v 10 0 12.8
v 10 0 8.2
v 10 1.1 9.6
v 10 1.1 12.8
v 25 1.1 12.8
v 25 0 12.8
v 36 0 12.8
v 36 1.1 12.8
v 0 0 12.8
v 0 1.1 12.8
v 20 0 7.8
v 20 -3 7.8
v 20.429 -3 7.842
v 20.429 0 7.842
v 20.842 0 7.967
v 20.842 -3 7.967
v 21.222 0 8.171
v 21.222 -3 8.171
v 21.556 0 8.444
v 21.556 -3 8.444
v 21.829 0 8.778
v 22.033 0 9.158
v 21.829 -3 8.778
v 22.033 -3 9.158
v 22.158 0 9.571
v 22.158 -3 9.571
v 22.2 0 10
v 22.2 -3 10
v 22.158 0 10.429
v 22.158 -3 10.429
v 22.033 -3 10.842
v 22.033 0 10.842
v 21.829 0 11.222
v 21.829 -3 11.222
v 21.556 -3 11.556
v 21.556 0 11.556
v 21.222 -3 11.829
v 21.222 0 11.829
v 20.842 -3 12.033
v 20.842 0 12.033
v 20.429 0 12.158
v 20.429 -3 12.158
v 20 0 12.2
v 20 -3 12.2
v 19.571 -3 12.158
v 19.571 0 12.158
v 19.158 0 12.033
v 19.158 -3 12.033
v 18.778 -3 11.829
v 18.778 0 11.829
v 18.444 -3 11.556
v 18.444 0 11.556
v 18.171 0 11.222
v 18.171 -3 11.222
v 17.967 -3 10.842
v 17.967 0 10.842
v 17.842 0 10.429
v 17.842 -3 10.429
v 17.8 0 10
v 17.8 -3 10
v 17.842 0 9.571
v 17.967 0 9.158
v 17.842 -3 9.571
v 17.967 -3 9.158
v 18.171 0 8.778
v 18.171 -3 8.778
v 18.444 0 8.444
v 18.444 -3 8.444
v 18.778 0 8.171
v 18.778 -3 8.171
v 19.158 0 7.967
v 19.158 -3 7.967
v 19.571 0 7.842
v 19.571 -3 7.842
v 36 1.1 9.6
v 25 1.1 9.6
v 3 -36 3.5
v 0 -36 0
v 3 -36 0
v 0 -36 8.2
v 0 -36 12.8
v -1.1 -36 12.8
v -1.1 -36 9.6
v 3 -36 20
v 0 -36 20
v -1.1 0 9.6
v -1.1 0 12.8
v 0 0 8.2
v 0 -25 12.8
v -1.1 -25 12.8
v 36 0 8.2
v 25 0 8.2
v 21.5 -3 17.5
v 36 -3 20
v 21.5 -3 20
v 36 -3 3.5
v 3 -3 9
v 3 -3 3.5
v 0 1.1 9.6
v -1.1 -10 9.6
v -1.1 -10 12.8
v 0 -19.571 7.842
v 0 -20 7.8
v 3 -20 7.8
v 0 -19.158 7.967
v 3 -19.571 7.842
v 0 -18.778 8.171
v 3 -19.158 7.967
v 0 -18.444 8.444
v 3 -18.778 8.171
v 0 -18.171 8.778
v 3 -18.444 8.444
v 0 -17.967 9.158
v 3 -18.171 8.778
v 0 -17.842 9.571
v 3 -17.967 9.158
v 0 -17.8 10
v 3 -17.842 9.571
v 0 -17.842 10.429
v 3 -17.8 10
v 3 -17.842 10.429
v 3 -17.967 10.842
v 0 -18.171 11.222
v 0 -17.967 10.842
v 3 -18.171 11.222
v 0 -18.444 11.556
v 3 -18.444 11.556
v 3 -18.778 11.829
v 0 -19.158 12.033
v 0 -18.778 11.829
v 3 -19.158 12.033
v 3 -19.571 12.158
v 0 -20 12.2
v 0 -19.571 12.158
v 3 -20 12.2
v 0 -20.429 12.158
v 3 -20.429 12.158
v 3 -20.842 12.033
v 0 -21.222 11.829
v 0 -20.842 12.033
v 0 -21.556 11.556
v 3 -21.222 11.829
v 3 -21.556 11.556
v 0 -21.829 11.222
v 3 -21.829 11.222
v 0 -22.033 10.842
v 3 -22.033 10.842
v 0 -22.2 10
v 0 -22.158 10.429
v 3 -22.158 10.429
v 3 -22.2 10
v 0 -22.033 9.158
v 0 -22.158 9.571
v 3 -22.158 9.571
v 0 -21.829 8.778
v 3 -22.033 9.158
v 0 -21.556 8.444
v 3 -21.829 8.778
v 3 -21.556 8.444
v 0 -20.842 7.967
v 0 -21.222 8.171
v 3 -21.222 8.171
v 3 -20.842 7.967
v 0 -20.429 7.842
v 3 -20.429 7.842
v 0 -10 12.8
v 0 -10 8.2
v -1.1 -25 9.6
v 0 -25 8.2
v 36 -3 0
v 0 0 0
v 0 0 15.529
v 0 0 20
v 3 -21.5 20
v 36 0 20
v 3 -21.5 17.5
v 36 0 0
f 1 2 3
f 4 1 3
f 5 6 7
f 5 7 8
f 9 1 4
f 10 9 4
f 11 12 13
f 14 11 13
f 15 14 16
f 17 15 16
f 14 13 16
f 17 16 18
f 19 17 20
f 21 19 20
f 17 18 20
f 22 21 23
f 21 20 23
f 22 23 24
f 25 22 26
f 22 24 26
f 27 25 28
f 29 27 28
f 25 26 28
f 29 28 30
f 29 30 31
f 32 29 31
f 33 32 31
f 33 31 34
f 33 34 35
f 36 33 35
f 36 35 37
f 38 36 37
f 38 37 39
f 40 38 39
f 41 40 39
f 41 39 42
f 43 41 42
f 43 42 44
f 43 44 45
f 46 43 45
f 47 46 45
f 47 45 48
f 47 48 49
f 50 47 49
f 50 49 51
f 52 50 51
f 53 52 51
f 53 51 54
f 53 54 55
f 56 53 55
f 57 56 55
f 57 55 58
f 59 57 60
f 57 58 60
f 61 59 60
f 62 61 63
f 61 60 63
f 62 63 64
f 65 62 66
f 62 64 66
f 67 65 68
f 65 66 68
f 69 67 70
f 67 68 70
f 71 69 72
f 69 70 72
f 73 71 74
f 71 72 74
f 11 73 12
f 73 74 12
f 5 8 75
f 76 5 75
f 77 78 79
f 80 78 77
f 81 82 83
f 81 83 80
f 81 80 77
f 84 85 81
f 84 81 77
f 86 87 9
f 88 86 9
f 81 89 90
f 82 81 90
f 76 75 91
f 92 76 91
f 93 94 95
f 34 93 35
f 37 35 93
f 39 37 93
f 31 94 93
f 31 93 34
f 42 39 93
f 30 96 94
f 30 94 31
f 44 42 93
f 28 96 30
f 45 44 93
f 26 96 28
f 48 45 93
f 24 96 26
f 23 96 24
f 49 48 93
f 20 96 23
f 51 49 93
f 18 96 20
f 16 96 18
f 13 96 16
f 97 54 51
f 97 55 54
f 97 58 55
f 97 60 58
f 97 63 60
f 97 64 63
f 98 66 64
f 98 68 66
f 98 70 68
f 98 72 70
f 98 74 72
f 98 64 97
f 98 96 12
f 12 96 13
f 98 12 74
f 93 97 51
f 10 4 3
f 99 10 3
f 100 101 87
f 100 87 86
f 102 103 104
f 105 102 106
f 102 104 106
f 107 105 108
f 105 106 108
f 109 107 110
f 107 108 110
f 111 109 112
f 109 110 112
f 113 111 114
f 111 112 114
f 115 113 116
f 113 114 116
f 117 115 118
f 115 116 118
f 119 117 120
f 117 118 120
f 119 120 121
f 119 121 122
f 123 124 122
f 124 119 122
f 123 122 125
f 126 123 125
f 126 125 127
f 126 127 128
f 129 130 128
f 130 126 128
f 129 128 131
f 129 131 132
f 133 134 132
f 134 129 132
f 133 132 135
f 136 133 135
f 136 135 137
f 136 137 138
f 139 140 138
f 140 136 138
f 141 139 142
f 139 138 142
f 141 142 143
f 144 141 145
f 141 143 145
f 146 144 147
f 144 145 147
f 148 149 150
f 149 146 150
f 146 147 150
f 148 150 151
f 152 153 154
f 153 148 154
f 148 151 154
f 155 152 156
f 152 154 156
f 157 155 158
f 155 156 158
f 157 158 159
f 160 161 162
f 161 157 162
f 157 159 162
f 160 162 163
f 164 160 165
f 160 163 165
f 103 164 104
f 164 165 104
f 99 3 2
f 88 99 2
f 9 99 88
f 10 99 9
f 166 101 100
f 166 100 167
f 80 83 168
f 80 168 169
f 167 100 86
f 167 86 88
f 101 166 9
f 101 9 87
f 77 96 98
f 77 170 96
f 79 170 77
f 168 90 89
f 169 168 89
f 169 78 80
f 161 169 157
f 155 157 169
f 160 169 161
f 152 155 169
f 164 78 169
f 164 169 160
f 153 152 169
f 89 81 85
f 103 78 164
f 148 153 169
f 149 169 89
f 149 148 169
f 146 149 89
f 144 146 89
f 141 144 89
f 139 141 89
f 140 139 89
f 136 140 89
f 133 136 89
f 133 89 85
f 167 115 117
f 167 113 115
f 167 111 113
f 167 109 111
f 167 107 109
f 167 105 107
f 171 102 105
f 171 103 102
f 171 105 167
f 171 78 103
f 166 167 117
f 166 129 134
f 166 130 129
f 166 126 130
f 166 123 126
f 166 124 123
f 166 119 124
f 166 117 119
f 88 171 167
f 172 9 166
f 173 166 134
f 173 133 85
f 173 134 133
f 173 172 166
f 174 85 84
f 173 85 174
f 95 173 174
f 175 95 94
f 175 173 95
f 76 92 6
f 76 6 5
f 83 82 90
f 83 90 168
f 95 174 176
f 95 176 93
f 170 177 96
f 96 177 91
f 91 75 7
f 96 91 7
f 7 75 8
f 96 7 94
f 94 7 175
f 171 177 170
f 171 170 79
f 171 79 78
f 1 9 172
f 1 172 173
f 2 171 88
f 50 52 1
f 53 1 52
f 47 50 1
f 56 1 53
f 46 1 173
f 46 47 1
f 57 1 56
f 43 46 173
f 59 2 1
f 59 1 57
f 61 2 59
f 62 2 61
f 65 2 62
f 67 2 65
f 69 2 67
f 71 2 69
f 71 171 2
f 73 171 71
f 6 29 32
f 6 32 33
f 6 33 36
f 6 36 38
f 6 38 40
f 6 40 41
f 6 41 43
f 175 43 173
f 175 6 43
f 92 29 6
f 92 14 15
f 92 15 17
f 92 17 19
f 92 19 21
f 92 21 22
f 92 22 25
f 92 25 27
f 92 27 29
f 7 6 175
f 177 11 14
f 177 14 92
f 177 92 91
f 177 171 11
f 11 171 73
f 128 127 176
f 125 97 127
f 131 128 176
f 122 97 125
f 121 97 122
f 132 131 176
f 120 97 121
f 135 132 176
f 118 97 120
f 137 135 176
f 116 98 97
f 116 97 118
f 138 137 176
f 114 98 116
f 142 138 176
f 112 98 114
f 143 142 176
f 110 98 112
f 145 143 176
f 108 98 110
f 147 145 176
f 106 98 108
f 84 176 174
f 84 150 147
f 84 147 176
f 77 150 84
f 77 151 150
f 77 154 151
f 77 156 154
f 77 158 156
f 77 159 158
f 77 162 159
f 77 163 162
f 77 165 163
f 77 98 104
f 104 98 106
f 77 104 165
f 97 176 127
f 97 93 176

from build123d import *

# Parameters (mm, degrees)
BOSS_EXTRUDE1_DEPTH = 3.5
BOSS_EXTRUDE2_DEPTH = 16.5
BOSS_EXTRUDE3_DEPTH = 2.5
SKETCH4_R           = 2.2
CUT_EXTRUDE1_DEPTH  = 53.773099208
SKETCH5_R           = 2.2
CUT_EXTRUDE2_DEPTH  = 53.773099208
BOSS_EXTRUDE5_DEPTH = 36
SKETCH7_W           = 15
SKETCH7_H           = 1.1
CUT_EXTRUDE3_DEPTH  = 53.496095093
BOSS_EXTRUDE6_REACH = 57.429
SKETCH9_W           = 1.1
SKETCH9_H           = 15
CUT_EXTRUDE4_DEPTH  = 53.496095093
BOSS_EXTRUDE7_START = -12.383093
BOSS_EXTRUDE7_DEPTH = 12.383093
CUT_EXTRUDE5_DEPTH  = 60.161910074
CUT_EXTRUDE6_DEPTH  = 55.699177325


with BuildPart() as part:
    # Sketch1 → Boss-Extrude1 (new body)
    with BuildSketch(Plane.XY):
        Polygon((0, -36), (0, 0), (36, 0), (36, -3), (3, -36), align=None)
    extrude(amount=BOSS_EXTRUDE1_DEPTH)

    # Sketch2 → Boss-Extrude2 (add)
    with BuildSketch(Plane.XY.offset(3.5)):
        Polygon((0, -36), (0, 0), (36, 0), (36, -3), (3, -3), (3, -36), align=None)
    extrude(amount=BOSS_EXTRUDE2_DEPTH)

    # Sketch3 → Boss-Extrude3 (add)
    with BuildSketch(Plane.XY.offset(20)):
        Polygon((3, -21.5), (21.5, -3), (3, -3), align=None)
    extrude(amount=-BOSS_EXTRUDE3_DEPTH)

    # Sketch4 → Cut-Extrude1 (cut, through all)
    with BuildSketch(Plane.XZ.offset(3)):
        with Locations(Location((20, 10, 0), (0, 0, 270))):
            Circle(SKETCH4_R)
    extrude(amount=-CUT_EXTRUDE1_DEPTH, mode=Mode.SUBTRACT)

    # Sketch5 → Cut-Extrude2 (cut, through all)
    with BuildSketch(Plane(origin=(3, 0, 0), x_dir=(0, 0, -1), z_dir=(1, 0, 0))):
        with Locations((-10, -20)):
            Circle(SKETCH5_R)
    extrude(amount=-CUT_EXTRUDE2_DEPTH, mode=Mode.SUBTRACT)

    # Sketch6 → Boss-Extrude5 (add, through all)
    with BuildSketch(Plane(origin=(36, 0, 0), x_dir=(0, 0, -1), z_dir=(1, 0, 0))):
        Polygon((-12.8, 0), (-12.8, 1.1), (-9.6, 1.1), (-8.2, 0), align=None)
    extrude(amount=-BOSS_EXTRUDE5_DEPTH)

    # Sketch7 → Cut-Extrude3 (cut, through all)
    with BuildSketch(Plane.XY.offset(12.8)):
        with Locations((17.5, 0.55)):
            Rectangle(SKETCH7_W, SKETCH7_H)
    extrude(amount=-CUT_EXTRUDE3_DEPTH, mode=Mode.SUBTRACT)

    # Boss-Extrude6: up to this face of the body (flat: up to its plane)
    boss_extrude6_end = Plane(part.part.faces().sort_by_distance((0.411825206, 0, 16.4))[0])
    # Sketch8 → Boss-Extrude6 (add, up to the picked face)
    with BuildSketch(Plane.XZ.offset(36), mode=Mode.PRIVATE) as boss_extrude6_sk1:
        Polygon((0, 8.2), (0, 12.8), (-1.1, 12.8), (-1.1, 9.6), align=None)
    boss_extrude6_tool1 = split(extrude(boss_extrude6_sk1.sketch, amount=-BOSS_EXTRUDE6_REACH, mode=Mode.PRIVATE), bisect_by=boss_extrude6_end, keep=Keep.BOTH, mode=Mode.PRIVATE)
    add(boss_extrude6_tool1.solids().sort_by(Axis((-0.517094, -36, 10.82906), (0, 1, 0)))[0])

    # Sketch9 → Cut-Extrude4 (cut, through all)
    with BuildSketch(Plane.XY.offset(12.8)):
        with Locations((-0.55, -17.5)):
            Rectangle(SKETCH9_W, SKETCH9_H)
    extrude(amount=-CUT_EXTRUDE4_DEPTH, mode=Mode.SUBTRACT)

    # Sketch11 → Boss-Extrude7 (add)
    with BuildSketch(Plane(origin=(-2.016949153, 2.016949153, 4.389830508), x_dir=(-0.9228036153935797, -0.16085056987258428, -0.35008653442856574), z_dir=(0.3852706677344363, -0.38527066773443636, -0.8385302768337725)).offset(BOSS_EXTRUDE7_START)):
        Polygon((-25.484240374, -10.032283534), (-5.436637946, -26.842805147), (-5.436637946, -6.483532076), align=None)
    extrude(amount=BOSS_EXTRUDE7_DEPTH)

    # Sketch12 → Cut-Extrude5 (cut, through all)
    with BuildSketch(Plane(origin=(36, 0, 0), x_dir=(0, 0, -1), z_dir=(1, 0, 0))):
        Polygon((-20, 0), (-20, -21.5), (-27.88359819, -21.5), (-27.88359819, 1.770842411), (-14.747015728, 1.770842411), (-14.747015728, 0), align=None)
    extrude(amount=-CUT_EXTRUDE5_DEPTH, mode=Mode.SUBTRACT)

    # Sketch13 → Cut-Extrude6 (cut, through all)
    with BuildSketch(Plane(origin=(0, 0, 0), x_dir=(1, 0, 0), z_dir=(0, 1, 0))):
        Polygon((0, -15.529411765), (0, -20), (-1.6960193, -20), align=None)
    extrude(amount=-CUT_EXTRUDE6_DEPTH, mode=Mode.SUBTRACT)


solid = part.part
